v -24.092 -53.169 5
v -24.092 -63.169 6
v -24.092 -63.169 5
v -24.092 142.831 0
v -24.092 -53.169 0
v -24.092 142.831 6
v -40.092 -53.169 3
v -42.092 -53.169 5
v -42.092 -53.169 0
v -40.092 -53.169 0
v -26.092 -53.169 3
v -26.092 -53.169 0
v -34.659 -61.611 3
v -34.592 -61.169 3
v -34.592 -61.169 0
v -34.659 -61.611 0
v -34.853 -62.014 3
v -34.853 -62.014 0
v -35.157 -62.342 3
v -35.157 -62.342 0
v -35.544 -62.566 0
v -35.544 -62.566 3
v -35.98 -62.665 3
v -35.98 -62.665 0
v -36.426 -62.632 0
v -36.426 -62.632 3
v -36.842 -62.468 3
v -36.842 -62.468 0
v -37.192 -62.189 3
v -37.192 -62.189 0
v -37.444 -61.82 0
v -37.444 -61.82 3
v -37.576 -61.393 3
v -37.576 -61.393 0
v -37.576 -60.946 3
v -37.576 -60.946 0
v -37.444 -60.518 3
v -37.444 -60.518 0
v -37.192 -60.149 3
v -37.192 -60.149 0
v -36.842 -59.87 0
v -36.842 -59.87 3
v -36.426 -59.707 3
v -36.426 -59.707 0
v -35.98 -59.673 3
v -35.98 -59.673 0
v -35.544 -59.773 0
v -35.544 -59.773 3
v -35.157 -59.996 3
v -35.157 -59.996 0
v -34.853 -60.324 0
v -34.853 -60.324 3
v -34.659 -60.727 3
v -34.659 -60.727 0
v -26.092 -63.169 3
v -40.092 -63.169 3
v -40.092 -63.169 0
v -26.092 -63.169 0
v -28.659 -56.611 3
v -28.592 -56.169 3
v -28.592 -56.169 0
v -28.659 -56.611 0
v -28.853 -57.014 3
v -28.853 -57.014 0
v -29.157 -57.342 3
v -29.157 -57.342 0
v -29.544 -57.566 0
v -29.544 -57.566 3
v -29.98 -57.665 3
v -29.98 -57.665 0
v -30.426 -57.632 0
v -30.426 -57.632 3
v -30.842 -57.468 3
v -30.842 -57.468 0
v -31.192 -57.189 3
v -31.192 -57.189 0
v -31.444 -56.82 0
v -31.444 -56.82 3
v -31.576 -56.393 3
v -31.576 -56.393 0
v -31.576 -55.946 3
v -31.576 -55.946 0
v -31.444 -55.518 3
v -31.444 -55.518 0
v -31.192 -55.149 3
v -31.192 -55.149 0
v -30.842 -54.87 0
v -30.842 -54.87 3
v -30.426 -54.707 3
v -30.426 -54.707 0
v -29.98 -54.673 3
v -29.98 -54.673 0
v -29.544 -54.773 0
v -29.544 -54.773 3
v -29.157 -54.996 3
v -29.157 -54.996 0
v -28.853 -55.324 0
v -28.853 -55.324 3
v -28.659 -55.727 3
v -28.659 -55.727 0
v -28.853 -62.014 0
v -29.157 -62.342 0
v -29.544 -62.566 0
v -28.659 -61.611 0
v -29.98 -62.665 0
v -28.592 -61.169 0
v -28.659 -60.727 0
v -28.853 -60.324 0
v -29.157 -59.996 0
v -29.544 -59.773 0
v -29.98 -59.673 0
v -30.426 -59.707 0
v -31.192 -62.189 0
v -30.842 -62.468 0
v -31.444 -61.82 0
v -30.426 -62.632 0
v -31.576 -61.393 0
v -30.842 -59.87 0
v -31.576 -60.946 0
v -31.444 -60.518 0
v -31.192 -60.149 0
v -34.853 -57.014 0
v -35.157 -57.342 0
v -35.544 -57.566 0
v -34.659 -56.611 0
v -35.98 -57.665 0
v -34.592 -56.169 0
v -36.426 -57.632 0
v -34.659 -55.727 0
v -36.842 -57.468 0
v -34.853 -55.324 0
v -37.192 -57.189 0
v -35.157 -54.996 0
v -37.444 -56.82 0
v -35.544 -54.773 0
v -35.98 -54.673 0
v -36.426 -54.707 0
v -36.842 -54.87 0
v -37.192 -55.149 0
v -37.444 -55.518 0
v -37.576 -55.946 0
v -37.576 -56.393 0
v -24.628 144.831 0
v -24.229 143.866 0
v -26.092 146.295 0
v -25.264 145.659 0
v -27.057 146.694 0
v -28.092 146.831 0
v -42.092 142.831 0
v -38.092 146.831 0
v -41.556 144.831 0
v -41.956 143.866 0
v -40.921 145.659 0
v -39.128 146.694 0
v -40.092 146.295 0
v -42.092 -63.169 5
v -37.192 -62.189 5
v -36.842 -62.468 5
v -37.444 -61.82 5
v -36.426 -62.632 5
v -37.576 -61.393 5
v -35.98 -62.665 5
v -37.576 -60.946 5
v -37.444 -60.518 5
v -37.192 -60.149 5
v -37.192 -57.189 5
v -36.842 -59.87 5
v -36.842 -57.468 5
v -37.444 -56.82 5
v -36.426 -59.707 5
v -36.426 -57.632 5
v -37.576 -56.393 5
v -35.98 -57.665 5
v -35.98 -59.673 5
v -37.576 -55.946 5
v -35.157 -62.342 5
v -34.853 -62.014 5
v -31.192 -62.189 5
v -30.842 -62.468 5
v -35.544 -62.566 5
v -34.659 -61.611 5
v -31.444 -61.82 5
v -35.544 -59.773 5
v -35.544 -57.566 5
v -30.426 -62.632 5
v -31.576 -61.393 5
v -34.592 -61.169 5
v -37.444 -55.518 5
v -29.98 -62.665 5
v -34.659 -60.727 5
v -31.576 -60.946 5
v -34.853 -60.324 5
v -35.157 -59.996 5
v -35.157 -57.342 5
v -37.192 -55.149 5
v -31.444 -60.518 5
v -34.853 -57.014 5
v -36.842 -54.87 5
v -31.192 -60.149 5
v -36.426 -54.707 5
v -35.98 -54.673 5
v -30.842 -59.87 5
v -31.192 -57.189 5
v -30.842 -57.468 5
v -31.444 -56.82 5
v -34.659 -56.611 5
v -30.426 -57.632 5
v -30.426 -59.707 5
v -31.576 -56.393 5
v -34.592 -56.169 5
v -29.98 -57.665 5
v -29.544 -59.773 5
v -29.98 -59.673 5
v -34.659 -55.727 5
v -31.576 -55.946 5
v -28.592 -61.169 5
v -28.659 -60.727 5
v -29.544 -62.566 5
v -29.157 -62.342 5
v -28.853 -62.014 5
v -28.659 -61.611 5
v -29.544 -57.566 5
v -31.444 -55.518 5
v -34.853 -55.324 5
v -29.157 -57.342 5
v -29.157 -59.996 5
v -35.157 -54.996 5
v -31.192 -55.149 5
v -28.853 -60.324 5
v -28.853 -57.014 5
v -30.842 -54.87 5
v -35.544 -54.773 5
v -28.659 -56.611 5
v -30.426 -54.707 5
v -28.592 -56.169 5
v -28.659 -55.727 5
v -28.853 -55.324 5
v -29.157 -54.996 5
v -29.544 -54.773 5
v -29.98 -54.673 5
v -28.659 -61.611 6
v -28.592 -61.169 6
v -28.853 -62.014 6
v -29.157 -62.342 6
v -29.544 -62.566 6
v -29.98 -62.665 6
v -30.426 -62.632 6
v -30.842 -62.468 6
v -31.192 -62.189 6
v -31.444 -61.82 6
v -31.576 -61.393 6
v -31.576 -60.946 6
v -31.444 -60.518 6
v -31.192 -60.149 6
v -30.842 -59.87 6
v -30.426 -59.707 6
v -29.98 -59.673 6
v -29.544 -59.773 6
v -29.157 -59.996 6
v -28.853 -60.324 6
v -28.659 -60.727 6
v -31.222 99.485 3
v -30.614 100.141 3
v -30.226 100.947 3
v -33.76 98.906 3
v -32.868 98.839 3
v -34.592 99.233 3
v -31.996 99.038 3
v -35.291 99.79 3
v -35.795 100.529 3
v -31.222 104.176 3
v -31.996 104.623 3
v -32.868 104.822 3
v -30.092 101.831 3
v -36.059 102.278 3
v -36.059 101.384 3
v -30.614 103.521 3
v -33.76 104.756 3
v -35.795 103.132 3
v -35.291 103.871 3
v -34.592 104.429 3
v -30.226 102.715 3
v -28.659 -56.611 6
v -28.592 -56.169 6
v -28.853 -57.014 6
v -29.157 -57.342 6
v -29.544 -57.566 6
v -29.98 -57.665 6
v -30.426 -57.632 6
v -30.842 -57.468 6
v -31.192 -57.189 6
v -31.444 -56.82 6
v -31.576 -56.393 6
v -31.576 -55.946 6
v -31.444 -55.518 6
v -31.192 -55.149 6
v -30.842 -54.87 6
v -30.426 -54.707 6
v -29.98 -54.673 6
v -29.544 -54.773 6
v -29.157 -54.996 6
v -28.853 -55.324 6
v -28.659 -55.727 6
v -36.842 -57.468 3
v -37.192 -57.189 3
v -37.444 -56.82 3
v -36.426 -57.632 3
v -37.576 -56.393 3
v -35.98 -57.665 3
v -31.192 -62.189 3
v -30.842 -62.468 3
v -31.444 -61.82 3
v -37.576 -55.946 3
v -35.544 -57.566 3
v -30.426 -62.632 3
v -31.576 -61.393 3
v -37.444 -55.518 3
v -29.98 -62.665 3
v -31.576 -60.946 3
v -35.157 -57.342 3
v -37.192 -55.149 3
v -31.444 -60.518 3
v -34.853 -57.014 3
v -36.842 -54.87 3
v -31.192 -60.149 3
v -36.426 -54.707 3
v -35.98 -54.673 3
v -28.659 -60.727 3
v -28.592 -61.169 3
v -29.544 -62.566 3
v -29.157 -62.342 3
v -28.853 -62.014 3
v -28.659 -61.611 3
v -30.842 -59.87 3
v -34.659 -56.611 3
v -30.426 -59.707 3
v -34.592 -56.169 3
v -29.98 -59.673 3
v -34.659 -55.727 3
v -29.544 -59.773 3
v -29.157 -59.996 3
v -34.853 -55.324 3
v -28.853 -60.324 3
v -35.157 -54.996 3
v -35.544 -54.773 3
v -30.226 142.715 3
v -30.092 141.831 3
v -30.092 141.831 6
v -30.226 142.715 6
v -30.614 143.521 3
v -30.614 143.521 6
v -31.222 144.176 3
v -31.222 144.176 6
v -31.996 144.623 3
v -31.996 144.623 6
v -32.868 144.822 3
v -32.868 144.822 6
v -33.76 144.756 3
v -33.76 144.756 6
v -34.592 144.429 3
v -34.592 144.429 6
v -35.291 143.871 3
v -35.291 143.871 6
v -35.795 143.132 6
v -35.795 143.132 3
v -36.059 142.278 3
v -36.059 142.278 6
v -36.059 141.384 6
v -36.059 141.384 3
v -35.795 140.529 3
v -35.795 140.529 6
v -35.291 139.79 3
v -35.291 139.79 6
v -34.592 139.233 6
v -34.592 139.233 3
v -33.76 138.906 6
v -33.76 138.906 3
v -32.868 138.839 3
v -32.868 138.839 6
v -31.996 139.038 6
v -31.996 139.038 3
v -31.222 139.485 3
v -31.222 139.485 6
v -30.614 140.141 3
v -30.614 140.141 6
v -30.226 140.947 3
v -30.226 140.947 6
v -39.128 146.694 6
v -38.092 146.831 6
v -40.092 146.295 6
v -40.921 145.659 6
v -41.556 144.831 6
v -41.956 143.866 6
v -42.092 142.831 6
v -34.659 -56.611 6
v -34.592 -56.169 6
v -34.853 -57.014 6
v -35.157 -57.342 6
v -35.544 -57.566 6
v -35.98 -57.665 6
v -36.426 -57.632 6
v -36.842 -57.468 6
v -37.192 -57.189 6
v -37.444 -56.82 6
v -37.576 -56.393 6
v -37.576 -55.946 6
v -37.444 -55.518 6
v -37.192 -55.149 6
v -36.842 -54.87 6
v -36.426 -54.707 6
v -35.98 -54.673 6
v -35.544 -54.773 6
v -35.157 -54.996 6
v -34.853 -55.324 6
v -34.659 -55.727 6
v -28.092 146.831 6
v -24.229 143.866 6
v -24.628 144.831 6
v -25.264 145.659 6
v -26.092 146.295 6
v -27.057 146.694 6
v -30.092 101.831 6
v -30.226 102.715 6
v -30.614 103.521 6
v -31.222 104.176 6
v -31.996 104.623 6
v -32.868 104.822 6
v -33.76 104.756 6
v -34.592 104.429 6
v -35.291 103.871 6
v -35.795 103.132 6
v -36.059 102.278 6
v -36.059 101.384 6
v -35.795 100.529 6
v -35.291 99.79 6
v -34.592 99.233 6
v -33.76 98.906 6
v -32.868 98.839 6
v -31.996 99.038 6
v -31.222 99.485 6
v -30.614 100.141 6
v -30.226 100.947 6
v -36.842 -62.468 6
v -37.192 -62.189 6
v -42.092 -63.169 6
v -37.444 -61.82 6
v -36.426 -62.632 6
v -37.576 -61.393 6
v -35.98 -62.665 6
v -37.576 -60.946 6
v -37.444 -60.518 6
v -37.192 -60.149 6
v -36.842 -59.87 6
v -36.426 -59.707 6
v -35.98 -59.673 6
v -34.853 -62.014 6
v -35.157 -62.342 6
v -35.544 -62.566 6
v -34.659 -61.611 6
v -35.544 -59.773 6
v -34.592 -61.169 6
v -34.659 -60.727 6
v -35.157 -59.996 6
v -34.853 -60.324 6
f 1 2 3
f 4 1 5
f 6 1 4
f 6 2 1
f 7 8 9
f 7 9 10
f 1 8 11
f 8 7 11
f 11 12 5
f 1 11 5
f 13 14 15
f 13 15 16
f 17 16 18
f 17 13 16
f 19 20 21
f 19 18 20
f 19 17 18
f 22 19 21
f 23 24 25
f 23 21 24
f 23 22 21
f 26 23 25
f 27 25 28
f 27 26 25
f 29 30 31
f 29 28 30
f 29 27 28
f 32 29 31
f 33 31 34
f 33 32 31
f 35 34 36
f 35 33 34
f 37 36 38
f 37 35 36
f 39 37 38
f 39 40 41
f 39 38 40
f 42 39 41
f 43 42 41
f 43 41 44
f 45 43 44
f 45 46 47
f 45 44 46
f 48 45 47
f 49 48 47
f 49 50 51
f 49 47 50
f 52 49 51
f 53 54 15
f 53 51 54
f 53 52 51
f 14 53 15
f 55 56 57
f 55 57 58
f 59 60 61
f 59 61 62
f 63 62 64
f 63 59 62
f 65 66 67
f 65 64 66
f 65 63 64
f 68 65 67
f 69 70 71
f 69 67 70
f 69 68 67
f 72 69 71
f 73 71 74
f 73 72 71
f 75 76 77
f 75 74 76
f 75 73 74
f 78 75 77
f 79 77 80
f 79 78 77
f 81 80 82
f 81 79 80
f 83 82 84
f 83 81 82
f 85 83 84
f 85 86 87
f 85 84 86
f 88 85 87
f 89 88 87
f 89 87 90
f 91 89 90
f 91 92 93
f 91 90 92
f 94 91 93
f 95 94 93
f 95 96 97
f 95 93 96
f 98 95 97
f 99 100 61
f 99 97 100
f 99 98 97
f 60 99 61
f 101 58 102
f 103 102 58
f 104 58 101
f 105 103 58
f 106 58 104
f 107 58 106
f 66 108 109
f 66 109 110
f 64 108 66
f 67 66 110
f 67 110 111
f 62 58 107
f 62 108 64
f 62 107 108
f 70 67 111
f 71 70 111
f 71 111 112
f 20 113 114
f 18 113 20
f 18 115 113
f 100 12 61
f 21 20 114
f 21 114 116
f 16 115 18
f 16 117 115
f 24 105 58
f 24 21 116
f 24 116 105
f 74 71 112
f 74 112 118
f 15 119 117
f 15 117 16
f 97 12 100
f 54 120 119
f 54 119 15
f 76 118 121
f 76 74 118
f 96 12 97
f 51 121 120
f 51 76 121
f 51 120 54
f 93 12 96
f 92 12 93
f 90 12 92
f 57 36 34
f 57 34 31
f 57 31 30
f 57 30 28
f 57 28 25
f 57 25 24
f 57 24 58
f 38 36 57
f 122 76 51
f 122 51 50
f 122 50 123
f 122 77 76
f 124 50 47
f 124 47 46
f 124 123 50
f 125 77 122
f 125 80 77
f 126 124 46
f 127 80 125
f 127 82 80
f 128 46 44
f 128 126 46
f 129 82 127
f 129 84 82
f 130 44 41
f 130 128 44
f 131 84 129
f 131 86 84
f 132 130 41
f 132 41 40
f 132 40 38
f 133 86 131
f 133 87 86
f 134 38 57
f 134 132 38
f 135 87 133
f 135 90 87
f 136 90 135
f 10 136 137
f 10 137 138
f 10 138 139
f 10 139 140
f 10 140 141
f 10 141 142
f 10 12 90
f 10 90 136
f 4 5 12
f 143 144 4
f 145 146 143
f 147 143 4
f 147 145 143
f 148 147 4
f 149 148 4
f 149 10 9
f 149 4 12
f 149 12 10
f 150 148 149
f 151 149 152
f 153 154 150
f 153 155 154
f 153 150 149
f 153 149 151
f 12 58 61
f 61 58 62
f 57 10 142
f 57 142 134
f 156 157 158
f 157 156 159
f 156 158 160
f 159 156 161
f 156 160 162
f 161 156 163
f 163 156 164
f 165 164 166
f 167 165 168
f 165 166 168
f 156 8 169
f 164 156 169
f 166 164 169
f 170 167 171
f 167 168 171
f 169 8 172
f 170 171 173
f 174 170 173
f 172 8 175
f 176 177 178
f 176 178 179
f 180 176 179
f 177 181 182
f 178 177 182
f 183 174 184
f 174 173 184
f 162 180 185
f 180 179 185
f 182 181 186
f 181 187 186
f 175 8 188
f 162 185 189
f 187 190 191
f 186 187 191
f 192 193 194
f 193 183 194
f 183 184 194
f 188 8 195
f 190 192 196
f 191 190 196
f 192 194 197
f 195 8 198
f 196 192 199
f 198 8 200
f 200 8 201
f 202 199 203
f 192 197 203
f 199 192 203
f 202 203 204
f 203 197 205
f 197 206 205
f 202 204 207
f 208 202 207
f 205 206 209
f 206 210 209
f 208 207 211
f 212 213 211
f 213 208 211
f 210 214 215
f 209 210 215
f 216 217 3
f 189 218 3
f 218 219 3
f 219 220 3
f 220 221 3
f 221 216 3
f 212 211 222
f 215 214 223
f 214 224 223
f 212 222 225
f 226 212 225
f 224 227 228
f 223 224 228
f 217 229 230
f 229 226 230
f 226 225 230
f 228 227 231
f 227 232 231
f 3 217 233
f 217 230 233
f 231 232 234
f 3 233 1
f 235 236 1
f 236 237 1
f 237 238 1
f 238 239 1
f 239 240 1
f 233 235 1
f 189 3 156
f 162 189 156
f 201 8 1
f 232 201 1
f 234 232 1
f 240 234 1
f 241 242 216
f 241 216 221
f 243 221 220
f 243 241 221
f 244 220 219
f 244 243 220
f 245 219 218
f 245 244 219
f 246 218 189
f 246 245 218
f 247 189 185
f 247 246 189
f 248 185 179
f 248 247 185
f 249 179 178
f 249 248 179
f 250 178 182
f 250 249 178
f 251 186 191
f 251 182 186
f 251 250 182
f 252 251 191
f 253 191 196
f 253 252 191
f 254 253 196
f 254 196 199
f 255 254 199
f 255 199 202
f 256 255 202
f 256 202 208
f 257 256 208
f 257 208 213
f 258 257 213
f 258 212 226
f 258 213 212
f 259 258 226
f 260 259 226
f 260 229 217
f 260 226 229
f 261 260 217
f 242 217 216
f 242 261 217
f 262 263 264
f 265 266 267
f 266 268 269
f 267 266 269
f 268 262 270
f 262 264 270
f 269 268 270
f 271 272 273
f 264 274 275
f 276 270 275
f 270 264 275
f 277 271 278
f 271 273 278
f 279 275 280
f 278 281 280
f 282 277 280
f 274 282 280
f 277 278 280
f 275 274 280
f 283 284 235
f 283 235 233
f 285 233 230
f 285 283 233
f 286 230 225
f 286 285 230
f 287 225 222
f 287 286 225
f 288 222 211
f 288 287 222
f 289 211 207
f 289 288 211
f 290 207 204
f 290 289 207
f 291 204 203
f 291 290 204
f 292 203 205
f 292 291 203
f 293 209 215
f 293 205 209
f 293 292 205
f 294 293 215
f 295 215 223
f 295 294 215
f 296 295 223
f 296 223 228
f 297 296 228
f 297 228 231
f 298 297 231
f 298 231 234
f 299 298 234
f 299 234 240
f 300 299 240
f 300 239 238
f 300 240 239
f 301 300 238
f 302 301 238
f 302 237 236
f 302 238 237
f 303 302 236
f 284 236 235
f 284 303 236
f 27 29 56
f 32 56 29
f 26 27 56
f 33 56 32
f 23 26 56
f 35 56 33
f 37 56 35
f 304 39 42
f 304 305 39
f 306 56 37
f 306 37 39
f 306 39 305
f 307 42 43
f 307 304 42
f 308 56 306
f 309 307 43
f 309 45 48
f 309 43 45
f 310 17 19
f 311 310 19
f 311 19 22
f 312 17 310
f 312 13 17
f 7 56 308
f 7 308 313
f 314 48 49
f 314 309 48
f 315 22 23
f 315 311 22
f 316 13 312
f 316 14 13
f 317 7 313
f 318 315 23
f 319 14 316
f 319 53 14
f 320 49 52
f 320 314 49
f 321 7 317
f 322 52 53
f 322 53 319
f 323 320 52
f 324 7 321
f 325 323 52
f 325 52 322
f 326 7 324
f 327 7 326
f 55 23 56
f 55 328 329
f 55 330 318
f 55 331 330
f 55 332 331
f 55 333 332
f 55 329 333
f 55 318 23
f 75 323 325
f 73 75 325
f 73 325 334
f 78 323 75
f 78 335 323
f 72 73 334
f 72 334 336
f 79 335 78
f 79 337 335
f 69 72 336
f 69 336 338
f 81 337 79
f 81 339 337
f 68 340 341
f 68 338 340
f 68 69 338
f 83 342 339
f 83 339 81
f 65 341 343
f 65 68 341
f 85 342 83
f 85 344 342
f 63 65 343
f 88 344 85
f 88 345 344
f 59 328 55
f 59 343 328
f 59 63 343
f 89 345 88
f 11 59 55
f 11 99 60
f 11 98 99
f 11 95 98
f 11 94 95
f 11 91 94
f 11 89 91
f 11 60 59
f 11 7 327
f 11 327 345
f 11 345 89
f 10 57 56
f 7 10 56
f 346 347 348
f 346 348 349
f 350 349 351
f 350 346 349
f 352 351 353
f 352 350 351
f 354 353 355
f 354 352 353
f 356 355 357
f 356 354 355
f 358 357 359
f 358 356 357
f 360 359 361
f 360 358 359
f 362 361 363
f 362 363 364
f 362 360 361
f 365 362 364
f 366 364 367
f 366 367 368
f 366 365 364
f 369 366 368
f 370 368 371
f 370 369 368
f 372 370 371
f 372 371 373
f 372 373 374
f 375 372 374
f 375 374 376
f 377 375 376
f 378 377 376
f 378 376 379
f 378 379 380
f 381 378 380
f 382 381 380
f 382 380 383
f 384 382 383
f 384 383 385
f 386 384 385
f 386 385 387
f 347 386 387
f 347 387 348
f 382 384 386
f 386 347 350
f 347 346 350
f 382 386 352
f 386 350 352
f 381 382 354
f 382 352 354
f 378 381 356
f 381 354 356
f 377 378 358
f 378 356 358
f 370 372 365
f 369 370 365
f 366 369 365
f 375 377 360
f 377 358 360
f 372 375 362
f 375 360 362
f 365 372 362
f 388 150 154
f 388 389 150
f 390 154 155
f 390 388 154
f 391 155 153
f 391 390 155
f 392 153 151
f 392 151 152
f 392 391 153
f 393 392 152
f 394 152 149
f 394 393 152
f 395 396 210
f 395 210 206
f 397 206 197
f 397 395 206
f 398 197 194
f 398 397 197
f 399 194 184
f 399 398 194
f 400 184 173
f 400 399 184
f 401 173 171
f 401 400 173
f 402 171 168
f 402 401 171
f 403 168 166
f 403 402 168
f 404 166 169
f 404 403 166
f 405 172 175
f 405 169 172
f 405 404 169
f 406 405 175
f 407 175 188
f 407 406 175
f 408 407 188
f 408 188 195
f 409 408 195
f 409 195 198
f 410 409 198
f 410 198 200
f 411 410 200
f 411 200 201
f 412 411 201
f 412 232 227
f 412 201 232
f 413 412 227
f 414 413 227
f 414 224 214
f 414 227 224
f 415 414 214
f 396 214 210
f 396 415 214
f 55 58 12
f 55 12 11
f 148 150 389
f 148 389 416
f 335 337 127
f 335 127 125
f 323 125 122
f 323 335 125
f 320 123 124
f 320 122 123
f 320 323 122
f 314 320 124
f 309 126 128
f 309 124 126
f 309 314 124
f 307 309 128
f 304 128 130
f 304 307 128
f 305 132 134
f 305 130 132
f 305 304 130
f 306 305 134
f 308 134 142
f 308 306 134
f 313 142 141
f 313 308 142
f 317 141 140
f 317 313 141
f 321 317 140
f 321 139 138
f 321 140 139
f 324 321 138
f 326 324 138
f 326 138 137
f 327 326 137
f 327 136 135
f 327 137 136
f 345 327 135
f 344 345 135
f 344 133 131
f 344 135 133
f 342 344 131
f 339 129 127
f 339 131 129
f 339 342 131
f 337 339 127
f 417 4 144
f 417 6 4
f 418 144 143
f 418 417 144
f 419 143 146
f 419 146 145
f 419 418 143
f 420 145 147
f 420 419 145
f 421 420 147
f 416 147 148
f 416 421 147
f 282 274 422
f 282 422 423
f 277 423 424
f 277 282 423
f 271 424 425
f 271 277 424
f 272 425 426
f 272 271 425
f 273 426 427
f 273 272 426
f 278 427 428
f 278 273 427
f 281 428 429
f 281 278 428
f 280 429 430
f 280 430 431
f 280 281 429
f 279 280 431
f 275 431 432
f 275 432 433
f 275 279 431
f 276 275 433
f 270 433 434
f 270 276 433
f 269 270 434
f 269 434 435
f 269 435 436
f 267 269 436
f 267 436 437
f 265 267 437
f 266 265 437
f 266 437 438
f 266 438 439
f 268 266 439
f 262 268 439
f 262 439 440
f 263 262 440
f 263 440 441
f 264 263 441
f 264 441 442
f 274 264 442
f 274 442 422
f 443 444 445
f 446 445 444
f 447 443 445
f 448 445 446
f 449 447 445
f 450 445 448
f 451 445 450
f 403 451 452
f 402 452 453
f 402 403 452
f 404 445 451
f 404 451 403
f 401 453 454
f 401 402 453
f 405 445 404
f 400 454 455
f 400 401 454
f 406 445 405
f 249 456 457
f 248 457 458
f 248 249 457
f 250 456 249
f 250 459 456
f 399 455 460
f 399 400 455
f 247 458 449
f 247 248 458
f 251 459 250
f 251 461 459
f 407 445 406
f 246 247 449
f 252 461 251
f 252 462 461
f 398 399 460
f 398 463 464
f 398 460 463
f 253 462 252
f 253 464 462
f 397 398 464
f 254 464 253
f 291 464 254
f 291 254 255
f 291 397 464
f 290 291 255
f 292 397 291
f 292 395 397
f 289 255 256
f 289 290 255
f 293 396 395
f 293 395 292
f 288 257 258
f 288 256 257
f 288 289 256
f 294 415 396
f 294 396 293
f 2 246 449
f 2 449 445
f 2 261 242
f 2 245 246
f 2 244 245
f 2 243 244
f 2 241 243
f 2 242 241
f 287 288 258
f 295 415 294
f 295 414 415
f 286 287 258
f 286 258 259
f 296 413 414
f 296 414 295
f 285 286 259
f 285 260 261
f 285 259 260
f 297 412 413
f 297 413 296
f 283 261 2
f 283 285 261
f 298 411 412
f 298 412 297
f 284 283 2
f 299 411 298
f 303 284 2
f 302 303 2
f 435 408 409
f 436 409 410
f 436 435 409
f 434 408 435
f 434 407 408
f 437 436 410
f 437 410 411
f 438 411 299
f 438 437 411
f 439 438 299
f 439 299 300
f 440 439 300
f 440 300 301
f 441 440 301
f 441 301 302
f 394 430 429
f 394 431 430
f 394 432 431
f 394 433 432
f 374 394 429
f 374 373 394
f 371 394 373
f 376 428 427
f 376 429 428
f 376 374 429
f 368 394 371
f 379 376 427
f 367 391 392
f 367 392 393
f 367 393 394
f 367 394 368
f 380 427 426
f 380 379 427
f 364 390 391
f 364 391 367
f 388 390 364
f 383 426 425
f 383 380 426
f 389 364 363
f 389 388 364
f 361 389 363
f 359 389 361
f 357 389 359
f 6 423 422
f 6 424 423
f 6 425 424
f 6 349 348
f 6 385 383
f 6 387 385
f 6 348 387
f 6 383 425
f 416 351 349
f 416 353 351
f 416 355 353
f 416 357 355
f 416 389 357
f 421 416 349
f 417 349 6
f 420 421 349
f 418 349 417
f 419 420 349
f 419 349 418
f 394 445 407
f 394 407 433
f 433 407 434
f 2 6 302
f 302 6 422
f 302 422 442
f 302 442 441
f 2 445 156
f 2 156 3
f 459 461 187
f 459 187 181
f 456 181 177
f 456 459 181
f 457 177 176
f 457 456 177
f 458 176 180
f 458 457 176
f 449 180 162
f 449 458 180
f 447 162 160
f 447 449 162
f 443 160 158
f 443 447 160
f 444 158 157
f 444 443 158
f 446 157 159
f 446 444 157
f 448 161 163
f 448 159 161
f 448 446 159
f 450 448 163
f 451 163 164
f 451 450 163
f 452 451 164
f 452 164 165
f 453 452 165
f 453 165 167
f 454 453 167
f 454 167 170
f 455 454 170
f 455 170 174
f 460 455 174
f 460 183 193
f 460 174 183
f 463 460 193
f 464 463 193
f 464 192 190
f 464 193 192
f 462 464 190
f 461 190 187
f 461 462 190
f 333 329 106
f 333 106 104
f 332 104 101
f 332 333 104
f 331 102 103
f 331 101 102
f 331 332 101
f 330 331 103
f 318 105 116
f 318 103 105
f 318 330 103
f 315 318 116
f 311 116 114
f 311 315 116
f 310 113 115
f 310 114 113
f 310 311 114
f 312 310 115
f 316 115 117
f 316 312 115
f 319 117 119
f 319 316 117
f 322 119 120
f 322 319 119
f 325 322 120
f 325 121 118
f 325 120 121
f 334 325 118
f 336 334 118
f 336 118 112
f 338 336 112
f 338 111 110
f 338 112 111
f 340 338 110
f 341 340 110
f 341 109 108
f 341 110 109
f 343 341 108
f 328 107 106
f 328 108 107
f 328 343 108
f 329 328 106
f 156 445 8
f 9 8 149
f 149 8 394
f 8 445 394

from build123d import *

# Parameters (mm, degrees)
SKETCH_1_W               = 18
SKETCH_1_H               = 200
SKETCH_1_R               = 3
EXTRUDE_1_DEPTH          = 6
SKETCH_2_W               = 14
SKETCH_2_H               = 3
EXTRUDE_2_DEPTH          = 10
SKETCH_5_W               = 18
SKETCH_5_H               = 10
EXTRUDE_4_DEPTH          = 1
CUT_EXTRUDE_2_DEPTH      = 153.826820813
CUT_EXTRUDE_2_DEPTH_BACK = 3
SKETCH_7_R               = 1.5
SKETCH_8_R               = 3
EXTRUDE_5_DEPTH          = 3
FILLET_1_R               = 4


with BuildPart() as part:
    # 草图1 → 凸台-拉伸1 (new body)
    with BuildSketch(Plane.XY):
        with Locations((-33.092307692, 46.830769231)):
            Rectangle(SKETCH_1_W, SKETCH_1_H)
        with Locations((-33.092307692, 141.830769231)):
            Circle(SKETCH_1_R, mode=Mode.SUBTRACT)
        with Locations((-33.092307692, 101.830769231)):
            Circle(SKETCH_1_R, mode=Mode.SUBTRACT)
    extrude(amount=EXTRUDE_1_DEPTH)

    # 草图2 → 凸台-拉伸2 (add)
    with BuildSketch(Plane.XZ.offset(53.169230769)):
        with Locations((-33.092307692, 1.5)):
            Rectangle(SKETCH_2_W, SKETCH_2_H)
    extrude(amount=EXTRUDE_2_DEPTH)

    # 草图5 → 凸台-拉伸4 (add)
    with BuildSketch(Plane.XY.offset(6)):
        with Locations((-33.092307692, -58.169230769)):
            Rectangle(SKETCH_5_W, SKETCH_5_H)
    extrude(amount=-EXTRUDE_4_DEPTH)

    # 草图7 → 切除-拉伸2 (cut, two sides: drawn at the far end of the back side and taken through both)
    with BuildSketch(Plane(origin=(0, 0, 5), x_dir=(-1, 0, 0), z_dir=(0, 0, -1)).offset(-CUT_EXTRUDE_2_DEPTH_BACK)):
        with Locations(Location((30.092307692, -56.169230769, 0), (0, 0, 180))):
            Circle(SKETCH_7_R)
        with Locations(Location((36.092307692, -56.169230769, 0), (0, 0, 180))):
            Circle(SKETCH_7_R)
        with Locations(Location((30.092307692, -61.169230769, 0), (0, 0, 180))):
            Circle(SKETCH_7_R)
        with Locations(Location((36.092307692, -61.169230769, 0), (0, 0, 180))):
            Circle(SKETCH_7_R)
    extrude(amount=CUT_EXTRUDE_2_DEPTH + CUT_EXTRUDE_2_DEPTH_BACK, mode=Mode.SUBTRACT)

    # 草图8 → 凸台-拉伸5 (add)
    with BuildSketch(Plane(origin=(0, 0, 0), x_dir=(-1, 0, 0), z_dir=(0, 0, -1))):
        with Locations((33.092307692, 141.830769231)):
            Circle(SKETCH_8_R)
        with Locations((33.092307692, 101.830769231)):
            Circle(SKETCH_8_R)
    extrude(amount=-EXTRUDE_5_DEPTH)

    # 圆角1
    fillet_1_edges = [part.edges().sort_by_distance(p)[0] for p in [
        (-42.092307692, 146.830769231, 3),
        (-24.092307692, 146.830769231, 3),
    ]]
    fillet(fillet_1_edges, radius=FILLET_1_R)


solid = part.part
